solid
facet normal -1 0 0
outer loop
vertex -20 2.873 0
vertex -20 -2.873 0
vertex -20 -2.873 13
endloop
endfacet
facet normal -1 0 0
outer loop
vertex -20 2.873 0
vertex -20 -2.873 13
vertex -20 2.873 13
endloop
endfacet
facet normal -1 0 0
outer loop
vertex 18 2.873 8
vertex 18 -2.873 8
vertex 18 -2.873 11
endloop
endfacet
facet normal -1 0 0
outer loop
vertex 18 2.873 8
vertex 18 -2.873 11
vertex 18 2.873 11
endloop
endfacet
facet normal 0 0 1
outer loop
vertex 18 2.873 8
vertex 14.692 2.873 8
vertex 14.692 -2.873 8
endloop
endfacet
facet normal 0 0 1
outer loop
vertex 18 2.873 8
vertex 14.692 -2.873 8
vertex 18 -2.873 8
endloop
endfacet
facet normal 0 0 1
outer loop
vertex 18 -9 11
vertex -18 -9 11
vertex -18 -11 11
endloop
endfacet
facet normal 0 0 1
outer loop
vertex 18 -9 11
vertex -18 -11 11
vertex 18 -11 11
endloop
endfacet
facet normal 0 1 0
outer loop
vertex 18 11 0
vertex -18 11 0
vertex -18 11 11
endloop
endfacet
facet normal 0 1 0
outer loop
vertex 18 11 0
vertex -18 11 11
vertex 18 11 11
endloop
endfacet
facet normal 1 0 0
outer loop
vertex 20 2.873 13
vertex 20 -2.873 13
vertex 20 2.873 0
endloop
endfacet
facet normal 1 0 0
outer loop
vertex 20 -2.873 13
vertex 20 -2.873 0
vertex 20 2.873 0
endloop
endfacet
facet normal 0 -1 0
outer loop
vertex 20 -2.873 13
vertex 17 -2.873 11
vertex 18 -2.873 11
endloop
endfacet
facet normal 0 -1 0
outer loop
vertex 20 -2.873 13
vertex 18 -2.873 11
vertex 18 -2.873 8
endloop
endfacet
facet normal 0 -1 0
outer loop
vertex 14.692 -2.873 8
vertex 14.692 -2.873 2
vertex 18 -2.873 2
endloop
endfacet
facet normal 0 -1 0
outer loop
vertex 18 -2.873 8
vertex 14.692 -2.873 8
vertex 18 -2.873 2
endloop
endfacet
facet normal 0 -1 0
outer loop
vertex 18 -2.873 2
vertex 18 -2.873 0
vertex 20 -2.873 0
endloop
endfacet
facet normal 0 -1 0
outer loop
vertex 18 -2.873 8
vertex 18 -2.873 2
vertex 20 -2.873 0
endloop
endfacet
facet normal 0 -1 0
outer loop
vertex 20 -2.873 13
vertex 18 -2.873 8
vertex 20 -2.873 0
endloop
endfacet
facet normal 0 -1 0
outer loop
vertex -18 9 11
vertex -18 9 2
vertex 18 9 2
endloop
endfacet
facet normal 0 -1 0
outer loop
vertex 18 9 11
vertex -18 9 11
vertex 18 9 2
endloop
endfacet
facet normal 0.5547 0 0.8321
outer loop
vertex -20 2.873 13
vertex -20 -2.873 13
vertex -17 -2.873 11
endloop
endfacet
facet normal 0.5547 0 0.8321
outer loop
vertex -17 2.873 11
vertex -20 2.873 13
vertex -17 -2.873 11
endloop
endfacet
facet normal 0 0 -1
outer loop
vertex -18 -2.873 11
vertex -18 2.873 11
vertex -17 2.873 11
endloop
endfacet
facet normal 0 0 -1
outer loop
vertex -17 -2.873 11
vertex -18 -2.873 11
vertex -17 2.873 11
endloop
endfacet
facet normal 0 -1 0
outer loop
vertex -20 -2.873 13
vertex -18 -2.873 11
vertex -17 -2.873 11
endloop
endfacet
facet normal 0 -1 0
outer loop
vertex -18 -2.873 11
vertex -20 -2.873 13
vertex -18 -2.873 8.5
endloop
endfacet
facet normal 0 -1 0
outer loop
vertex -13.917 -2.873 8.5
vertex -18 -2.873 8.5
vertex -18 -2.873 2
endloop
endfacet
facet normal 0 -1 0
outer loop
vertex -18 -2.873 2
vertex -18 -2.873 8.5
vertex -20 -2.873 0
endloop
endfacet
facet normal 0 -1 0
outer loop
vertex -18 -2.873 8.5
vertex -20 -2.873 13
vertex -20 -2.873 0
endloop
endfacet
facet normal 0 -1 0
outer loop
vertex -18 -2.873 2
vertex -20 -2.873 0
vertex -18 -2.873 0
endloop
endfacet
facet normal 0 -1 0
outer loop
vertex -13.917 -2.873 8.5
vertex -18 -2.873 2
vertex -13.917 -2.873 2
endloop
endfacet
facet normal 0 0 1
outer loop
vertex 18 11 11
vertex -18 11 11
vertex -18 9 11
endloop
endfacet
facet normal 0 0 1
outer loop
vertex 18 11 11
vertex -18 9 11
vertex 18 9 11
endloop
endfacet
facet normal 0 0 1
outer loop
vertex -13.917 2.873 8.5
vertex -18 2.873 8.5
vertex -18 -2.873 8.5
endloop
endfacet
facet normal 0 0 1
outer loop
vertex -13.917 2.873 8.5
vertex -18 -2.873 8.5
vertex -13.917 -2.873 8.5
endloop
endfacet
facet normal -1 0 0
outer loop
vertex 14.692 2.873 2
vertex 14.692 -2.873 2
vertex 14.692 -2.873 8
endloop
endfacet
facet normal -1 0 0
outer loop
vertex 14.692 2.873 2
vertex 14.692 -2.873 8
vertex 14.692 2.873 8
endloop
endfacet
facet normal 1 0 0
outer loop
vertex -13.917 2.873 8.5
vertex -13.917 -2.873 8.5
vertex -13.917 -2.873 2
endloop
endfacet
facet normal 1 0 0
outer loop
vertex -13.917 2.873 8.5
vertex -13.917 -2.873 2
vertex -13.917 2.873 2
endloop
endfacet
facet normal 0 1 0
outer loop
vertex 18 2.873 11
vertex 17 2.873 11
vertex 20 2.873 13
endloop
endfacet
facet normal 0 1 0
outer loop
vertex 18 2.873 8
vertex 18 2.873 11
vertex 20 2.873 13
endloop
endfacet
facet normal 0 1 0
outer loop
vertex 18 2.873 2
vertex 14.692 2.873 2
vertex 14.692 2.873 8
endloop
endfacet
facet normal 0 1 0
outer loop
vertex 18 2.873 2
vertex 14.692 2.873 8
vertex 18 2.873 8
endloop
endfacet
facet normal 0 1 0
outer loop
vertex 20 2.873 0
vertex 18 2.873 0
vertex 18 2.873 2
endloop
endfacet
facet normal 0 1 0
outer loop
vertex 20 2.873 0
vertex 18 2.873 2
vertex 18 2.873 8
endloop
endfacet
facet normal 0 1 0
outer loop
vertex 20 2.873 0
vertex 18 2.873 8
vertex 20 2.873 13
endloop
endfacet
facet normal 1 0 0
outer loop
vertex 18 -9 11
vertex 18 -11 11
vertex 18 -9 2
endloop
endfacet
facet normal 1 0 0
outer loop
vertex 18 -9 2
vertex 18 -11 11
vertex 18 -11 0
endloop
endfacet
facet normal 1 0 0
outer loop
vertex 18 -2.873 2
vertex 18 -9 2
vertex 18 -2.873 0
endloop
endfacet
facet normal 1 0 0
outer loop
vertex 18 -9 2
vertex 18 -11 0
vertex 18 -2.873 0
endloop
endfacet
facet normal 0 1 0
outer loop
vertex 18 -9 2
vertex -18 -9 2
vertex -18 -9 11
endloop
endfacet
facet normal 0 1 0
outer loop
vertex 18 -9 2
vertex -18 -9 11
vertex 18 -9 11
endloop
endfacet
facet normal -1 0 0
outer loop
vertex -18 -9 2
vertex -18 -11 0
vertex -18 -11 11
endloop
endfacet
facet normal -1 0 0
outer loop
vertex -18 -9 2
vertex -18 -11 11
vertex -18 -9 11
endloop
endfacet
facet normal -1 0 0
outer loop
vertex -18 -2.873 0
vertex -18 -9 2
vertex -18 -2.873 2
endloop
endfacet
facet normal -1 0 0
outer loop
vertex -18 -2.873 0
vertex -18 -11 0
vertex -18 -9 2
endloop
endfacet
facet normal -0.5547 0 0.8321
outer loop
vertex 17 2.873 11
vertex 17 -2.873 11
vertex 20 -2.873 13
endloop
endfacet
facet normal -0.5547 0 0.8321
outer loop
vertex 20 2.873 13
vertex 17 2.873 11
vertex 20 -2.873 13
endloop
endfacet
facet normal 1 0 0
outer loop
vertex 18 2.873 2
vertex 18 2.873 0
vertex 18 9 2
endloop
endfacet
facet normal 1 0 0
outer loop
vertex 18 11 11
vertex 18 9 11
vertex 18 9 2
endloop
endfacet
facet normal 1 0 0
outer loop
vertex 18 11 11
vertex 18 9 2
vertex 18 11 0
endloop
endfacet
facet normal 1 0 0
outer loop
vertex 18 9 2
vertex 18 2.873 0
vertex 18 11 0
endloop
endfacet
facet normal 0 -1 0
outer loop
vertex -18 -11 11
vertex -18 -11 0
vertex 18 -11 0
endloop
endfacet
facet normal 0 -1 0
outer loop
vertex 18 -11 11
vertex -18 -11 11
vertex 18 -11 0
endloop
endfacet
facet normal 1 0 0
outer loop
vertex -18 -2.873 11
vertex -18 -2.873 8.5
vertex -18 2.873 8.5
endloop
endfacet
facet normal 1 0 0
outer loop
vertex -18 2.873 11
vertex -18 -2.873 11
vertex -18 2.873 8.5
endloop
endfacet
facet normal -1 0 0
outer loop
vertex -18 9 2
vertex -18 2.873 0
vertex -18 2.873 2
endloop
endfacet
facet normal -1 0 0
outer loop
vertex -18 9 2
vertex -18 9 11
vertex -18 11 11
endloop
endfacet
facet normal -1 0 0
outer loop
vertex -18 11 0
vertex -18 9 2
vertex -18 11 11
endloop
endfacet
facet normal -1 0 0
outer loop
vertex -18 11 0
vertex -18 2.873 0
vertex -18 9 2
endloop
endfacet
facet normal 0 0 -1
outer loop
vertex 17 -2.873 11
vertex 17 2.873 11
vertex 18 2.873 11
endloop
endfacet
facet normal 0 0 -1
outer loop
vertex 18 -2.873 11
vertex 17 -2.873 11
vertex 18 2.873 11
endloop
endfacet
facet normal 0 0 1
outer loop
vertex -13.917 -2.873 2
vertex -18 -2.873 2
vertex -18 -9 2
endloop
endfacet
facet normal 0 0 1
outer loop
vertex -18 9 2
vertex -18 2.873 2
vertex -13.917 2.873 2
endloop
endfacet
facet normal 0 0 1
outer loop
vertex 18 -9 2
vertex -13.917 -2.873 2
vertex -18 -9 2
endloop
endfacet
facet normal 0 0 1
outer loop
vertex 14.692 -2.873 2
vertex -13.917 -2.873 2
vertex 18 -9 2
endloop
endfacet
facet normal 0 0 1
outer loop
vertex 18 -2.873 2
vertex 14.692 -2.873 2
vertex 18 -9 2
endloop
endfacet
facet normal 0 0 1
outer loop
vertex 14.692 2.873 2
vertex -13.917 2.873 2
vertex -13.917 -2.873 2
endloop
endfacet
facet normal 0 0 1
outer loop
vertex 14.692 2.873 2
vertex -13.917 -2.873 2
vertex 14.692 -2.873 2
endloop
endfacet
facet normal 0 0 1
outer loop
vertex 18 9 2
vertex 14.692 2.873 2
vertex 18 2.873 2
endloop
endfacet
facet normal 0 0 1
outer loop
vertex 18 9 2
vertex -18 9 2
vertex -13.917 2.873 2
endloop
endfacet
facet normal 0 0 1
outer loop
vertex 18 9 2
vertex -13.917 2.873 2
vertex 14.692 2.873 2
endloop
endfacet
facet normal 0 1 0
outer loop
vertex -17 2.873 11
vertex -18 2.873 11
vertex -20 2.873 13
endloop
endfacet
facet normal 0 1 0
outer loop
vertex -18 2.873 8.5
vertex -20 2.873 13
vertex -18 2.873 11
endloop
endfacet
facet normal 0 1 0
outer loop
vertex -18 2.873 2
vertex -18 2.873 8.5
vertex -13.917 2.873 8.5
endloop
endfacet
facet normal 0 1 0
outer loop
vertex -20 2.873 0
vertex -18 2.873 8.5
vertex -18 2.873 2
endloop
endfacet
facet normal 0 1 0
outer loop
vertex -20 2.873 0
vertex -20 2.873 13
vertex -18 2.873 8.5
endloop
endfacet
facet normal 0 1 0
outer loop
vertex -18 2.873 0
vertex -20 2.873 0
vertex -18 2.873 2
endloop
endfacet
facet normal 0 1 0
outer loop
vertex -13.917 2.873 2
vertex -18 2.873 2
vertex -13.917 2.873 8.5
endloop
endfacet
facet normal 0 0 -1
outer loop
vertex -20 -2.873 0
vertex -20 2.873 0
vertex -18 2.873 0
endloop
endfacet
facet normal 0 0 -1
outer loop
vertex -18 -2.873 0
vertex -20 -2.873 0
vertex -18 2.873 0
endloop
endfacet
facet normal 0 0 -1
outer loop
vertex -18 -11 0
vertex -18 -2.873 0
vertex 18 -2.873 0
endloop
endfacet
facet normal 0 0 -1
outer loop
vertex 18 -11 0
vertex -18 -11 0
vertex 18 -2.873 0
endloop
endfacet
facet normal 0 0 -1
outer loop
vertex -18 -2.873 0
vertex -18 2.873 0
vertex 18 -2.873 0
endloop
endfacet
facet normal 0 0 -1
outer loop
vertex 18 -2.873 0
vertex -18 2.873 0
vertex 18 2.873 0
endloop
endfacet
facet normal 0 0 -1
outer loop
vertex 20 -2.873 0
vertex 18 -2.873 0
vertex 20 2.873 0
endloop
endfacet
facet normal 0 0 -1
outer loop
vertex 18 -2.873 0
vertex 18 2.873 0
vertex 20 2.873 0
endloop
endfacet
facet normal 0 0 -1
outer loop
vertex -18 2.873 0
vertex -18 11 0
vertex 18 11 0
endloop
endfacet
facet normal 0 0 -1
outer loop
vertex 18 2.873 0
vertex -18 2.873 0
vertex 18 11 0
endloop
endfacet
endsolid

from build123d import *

# Parameters (mm, degrees)
F0_W      = 36
F0_H      = 2
F1_DEPTH  = 2
F0_W_2    = 4.0826744884
F0_H_2    = 5.745283328
F2_DEPTH  = 8.5
F3_DEPTH  = 11
F0_W_3    = 2
F4_DEPTH  = 11
F5_W      = 3
F5_H      = 5.745283328
F5_W_2    = 2
F5_W_3    = 1
F6_DEPTH  = 2
F8_DEPTH  = 5.745283328
F10_DEPTH = 5.745283328
F0_W_4    = 3.3082471341
F11_DEPTH = 8


# Not quite as in the source:
# - a feature names something its author has since deleted; it is built from what else it names


with BuildPart() as f1:
    # F0 (on Top) → F1 (new body)
    with BuildSketch(Plane.XY):
        with Locations((0, -10)):
            Rectangle(F0_W, F0_H)
        Polygon((-18, -9), (18, -9), (18, -2.872641664), (14.6917528659, -2.872641664), (14.6917528659, 2.872641664), (18, 2.872641664), (18, 9), (-18, 9), (-18, 2.872641664), (-13.9173255116, 2.872641664), (-13.9173255116, -2.872641664), (-18, -2.872641664), align=None)
    extrude(amount=F1_DEPTH)

    # F0 (on Top) → F2 (join)
    with BuildSketch(Plane.XY):
        with Locations((-15.9586627558, 0)):
            Rectangle(F0_W_2, F0_H_2)
    extrude(amount=F2_DEPTH)

    # F0 (on Top) → F3 (join)
    with BuildSketch(Plane.XY):
        with Locations((0, -10)):
            Rectangle(F0_W, F0_H)
        with Locations((0, 10)):
            Rectangle(F0_W, F0_H)
    extrude(amount=F3_DEPTH)

    # F0 (on Top) → F4 (join)
    with BuildSketch(Plane.XY):
        with Locations((-19, 0)):
            Rectangle(F0_W_3, F0_H_2)
        with Locations((19, 0)):
            Rectangle(F0_W_3, F0_H_2)
    extrude(amount=F4_DEPTH)

    # F5 (on face) → F6 (join)
    with BuildSketch(Plane.XY.offset(11)):
        with Locations((18.5, 0)):
            Rectangle(F5_W, F5_H)
        with Locations((-19, 0)):
            Rectangle(F5_W_2, F5_H)
        with Locations((-17.5, 0)):
            Rectangle(F5_W_3, F5_H)
    extrude(amount=F6_DEPTH)

    # F7 (on face) → F8 (cut, through all)
    with BuildSketch(Plane.XZ.offset(2.872641664)):
        Polygon((-20, 13), (-17, 11), (-17, 13), align=None)
    extrude(amount=-F8_DEPTH, mode=Mode.SUBTRACT)

    # F9 (on face) → F10 (cut, through all)
    with BuildSketch(Plane.XZ.offset(2.872641664)):
        Polygon((17, 13), (17, 11), (20, 13), align=None)
    extrude(amount=-F10_DEPTH, mode=Mode.SUBTRACT)

    # F0 (on Top) → F11 (join)
    with BuildSketch(Plane.XY):
        with Locations((16.345876433, 0)):
            Rectangle(F0_W_4, F0_H_2)
    extrude(amount=F11_DEPTH)


solid = f1.part
